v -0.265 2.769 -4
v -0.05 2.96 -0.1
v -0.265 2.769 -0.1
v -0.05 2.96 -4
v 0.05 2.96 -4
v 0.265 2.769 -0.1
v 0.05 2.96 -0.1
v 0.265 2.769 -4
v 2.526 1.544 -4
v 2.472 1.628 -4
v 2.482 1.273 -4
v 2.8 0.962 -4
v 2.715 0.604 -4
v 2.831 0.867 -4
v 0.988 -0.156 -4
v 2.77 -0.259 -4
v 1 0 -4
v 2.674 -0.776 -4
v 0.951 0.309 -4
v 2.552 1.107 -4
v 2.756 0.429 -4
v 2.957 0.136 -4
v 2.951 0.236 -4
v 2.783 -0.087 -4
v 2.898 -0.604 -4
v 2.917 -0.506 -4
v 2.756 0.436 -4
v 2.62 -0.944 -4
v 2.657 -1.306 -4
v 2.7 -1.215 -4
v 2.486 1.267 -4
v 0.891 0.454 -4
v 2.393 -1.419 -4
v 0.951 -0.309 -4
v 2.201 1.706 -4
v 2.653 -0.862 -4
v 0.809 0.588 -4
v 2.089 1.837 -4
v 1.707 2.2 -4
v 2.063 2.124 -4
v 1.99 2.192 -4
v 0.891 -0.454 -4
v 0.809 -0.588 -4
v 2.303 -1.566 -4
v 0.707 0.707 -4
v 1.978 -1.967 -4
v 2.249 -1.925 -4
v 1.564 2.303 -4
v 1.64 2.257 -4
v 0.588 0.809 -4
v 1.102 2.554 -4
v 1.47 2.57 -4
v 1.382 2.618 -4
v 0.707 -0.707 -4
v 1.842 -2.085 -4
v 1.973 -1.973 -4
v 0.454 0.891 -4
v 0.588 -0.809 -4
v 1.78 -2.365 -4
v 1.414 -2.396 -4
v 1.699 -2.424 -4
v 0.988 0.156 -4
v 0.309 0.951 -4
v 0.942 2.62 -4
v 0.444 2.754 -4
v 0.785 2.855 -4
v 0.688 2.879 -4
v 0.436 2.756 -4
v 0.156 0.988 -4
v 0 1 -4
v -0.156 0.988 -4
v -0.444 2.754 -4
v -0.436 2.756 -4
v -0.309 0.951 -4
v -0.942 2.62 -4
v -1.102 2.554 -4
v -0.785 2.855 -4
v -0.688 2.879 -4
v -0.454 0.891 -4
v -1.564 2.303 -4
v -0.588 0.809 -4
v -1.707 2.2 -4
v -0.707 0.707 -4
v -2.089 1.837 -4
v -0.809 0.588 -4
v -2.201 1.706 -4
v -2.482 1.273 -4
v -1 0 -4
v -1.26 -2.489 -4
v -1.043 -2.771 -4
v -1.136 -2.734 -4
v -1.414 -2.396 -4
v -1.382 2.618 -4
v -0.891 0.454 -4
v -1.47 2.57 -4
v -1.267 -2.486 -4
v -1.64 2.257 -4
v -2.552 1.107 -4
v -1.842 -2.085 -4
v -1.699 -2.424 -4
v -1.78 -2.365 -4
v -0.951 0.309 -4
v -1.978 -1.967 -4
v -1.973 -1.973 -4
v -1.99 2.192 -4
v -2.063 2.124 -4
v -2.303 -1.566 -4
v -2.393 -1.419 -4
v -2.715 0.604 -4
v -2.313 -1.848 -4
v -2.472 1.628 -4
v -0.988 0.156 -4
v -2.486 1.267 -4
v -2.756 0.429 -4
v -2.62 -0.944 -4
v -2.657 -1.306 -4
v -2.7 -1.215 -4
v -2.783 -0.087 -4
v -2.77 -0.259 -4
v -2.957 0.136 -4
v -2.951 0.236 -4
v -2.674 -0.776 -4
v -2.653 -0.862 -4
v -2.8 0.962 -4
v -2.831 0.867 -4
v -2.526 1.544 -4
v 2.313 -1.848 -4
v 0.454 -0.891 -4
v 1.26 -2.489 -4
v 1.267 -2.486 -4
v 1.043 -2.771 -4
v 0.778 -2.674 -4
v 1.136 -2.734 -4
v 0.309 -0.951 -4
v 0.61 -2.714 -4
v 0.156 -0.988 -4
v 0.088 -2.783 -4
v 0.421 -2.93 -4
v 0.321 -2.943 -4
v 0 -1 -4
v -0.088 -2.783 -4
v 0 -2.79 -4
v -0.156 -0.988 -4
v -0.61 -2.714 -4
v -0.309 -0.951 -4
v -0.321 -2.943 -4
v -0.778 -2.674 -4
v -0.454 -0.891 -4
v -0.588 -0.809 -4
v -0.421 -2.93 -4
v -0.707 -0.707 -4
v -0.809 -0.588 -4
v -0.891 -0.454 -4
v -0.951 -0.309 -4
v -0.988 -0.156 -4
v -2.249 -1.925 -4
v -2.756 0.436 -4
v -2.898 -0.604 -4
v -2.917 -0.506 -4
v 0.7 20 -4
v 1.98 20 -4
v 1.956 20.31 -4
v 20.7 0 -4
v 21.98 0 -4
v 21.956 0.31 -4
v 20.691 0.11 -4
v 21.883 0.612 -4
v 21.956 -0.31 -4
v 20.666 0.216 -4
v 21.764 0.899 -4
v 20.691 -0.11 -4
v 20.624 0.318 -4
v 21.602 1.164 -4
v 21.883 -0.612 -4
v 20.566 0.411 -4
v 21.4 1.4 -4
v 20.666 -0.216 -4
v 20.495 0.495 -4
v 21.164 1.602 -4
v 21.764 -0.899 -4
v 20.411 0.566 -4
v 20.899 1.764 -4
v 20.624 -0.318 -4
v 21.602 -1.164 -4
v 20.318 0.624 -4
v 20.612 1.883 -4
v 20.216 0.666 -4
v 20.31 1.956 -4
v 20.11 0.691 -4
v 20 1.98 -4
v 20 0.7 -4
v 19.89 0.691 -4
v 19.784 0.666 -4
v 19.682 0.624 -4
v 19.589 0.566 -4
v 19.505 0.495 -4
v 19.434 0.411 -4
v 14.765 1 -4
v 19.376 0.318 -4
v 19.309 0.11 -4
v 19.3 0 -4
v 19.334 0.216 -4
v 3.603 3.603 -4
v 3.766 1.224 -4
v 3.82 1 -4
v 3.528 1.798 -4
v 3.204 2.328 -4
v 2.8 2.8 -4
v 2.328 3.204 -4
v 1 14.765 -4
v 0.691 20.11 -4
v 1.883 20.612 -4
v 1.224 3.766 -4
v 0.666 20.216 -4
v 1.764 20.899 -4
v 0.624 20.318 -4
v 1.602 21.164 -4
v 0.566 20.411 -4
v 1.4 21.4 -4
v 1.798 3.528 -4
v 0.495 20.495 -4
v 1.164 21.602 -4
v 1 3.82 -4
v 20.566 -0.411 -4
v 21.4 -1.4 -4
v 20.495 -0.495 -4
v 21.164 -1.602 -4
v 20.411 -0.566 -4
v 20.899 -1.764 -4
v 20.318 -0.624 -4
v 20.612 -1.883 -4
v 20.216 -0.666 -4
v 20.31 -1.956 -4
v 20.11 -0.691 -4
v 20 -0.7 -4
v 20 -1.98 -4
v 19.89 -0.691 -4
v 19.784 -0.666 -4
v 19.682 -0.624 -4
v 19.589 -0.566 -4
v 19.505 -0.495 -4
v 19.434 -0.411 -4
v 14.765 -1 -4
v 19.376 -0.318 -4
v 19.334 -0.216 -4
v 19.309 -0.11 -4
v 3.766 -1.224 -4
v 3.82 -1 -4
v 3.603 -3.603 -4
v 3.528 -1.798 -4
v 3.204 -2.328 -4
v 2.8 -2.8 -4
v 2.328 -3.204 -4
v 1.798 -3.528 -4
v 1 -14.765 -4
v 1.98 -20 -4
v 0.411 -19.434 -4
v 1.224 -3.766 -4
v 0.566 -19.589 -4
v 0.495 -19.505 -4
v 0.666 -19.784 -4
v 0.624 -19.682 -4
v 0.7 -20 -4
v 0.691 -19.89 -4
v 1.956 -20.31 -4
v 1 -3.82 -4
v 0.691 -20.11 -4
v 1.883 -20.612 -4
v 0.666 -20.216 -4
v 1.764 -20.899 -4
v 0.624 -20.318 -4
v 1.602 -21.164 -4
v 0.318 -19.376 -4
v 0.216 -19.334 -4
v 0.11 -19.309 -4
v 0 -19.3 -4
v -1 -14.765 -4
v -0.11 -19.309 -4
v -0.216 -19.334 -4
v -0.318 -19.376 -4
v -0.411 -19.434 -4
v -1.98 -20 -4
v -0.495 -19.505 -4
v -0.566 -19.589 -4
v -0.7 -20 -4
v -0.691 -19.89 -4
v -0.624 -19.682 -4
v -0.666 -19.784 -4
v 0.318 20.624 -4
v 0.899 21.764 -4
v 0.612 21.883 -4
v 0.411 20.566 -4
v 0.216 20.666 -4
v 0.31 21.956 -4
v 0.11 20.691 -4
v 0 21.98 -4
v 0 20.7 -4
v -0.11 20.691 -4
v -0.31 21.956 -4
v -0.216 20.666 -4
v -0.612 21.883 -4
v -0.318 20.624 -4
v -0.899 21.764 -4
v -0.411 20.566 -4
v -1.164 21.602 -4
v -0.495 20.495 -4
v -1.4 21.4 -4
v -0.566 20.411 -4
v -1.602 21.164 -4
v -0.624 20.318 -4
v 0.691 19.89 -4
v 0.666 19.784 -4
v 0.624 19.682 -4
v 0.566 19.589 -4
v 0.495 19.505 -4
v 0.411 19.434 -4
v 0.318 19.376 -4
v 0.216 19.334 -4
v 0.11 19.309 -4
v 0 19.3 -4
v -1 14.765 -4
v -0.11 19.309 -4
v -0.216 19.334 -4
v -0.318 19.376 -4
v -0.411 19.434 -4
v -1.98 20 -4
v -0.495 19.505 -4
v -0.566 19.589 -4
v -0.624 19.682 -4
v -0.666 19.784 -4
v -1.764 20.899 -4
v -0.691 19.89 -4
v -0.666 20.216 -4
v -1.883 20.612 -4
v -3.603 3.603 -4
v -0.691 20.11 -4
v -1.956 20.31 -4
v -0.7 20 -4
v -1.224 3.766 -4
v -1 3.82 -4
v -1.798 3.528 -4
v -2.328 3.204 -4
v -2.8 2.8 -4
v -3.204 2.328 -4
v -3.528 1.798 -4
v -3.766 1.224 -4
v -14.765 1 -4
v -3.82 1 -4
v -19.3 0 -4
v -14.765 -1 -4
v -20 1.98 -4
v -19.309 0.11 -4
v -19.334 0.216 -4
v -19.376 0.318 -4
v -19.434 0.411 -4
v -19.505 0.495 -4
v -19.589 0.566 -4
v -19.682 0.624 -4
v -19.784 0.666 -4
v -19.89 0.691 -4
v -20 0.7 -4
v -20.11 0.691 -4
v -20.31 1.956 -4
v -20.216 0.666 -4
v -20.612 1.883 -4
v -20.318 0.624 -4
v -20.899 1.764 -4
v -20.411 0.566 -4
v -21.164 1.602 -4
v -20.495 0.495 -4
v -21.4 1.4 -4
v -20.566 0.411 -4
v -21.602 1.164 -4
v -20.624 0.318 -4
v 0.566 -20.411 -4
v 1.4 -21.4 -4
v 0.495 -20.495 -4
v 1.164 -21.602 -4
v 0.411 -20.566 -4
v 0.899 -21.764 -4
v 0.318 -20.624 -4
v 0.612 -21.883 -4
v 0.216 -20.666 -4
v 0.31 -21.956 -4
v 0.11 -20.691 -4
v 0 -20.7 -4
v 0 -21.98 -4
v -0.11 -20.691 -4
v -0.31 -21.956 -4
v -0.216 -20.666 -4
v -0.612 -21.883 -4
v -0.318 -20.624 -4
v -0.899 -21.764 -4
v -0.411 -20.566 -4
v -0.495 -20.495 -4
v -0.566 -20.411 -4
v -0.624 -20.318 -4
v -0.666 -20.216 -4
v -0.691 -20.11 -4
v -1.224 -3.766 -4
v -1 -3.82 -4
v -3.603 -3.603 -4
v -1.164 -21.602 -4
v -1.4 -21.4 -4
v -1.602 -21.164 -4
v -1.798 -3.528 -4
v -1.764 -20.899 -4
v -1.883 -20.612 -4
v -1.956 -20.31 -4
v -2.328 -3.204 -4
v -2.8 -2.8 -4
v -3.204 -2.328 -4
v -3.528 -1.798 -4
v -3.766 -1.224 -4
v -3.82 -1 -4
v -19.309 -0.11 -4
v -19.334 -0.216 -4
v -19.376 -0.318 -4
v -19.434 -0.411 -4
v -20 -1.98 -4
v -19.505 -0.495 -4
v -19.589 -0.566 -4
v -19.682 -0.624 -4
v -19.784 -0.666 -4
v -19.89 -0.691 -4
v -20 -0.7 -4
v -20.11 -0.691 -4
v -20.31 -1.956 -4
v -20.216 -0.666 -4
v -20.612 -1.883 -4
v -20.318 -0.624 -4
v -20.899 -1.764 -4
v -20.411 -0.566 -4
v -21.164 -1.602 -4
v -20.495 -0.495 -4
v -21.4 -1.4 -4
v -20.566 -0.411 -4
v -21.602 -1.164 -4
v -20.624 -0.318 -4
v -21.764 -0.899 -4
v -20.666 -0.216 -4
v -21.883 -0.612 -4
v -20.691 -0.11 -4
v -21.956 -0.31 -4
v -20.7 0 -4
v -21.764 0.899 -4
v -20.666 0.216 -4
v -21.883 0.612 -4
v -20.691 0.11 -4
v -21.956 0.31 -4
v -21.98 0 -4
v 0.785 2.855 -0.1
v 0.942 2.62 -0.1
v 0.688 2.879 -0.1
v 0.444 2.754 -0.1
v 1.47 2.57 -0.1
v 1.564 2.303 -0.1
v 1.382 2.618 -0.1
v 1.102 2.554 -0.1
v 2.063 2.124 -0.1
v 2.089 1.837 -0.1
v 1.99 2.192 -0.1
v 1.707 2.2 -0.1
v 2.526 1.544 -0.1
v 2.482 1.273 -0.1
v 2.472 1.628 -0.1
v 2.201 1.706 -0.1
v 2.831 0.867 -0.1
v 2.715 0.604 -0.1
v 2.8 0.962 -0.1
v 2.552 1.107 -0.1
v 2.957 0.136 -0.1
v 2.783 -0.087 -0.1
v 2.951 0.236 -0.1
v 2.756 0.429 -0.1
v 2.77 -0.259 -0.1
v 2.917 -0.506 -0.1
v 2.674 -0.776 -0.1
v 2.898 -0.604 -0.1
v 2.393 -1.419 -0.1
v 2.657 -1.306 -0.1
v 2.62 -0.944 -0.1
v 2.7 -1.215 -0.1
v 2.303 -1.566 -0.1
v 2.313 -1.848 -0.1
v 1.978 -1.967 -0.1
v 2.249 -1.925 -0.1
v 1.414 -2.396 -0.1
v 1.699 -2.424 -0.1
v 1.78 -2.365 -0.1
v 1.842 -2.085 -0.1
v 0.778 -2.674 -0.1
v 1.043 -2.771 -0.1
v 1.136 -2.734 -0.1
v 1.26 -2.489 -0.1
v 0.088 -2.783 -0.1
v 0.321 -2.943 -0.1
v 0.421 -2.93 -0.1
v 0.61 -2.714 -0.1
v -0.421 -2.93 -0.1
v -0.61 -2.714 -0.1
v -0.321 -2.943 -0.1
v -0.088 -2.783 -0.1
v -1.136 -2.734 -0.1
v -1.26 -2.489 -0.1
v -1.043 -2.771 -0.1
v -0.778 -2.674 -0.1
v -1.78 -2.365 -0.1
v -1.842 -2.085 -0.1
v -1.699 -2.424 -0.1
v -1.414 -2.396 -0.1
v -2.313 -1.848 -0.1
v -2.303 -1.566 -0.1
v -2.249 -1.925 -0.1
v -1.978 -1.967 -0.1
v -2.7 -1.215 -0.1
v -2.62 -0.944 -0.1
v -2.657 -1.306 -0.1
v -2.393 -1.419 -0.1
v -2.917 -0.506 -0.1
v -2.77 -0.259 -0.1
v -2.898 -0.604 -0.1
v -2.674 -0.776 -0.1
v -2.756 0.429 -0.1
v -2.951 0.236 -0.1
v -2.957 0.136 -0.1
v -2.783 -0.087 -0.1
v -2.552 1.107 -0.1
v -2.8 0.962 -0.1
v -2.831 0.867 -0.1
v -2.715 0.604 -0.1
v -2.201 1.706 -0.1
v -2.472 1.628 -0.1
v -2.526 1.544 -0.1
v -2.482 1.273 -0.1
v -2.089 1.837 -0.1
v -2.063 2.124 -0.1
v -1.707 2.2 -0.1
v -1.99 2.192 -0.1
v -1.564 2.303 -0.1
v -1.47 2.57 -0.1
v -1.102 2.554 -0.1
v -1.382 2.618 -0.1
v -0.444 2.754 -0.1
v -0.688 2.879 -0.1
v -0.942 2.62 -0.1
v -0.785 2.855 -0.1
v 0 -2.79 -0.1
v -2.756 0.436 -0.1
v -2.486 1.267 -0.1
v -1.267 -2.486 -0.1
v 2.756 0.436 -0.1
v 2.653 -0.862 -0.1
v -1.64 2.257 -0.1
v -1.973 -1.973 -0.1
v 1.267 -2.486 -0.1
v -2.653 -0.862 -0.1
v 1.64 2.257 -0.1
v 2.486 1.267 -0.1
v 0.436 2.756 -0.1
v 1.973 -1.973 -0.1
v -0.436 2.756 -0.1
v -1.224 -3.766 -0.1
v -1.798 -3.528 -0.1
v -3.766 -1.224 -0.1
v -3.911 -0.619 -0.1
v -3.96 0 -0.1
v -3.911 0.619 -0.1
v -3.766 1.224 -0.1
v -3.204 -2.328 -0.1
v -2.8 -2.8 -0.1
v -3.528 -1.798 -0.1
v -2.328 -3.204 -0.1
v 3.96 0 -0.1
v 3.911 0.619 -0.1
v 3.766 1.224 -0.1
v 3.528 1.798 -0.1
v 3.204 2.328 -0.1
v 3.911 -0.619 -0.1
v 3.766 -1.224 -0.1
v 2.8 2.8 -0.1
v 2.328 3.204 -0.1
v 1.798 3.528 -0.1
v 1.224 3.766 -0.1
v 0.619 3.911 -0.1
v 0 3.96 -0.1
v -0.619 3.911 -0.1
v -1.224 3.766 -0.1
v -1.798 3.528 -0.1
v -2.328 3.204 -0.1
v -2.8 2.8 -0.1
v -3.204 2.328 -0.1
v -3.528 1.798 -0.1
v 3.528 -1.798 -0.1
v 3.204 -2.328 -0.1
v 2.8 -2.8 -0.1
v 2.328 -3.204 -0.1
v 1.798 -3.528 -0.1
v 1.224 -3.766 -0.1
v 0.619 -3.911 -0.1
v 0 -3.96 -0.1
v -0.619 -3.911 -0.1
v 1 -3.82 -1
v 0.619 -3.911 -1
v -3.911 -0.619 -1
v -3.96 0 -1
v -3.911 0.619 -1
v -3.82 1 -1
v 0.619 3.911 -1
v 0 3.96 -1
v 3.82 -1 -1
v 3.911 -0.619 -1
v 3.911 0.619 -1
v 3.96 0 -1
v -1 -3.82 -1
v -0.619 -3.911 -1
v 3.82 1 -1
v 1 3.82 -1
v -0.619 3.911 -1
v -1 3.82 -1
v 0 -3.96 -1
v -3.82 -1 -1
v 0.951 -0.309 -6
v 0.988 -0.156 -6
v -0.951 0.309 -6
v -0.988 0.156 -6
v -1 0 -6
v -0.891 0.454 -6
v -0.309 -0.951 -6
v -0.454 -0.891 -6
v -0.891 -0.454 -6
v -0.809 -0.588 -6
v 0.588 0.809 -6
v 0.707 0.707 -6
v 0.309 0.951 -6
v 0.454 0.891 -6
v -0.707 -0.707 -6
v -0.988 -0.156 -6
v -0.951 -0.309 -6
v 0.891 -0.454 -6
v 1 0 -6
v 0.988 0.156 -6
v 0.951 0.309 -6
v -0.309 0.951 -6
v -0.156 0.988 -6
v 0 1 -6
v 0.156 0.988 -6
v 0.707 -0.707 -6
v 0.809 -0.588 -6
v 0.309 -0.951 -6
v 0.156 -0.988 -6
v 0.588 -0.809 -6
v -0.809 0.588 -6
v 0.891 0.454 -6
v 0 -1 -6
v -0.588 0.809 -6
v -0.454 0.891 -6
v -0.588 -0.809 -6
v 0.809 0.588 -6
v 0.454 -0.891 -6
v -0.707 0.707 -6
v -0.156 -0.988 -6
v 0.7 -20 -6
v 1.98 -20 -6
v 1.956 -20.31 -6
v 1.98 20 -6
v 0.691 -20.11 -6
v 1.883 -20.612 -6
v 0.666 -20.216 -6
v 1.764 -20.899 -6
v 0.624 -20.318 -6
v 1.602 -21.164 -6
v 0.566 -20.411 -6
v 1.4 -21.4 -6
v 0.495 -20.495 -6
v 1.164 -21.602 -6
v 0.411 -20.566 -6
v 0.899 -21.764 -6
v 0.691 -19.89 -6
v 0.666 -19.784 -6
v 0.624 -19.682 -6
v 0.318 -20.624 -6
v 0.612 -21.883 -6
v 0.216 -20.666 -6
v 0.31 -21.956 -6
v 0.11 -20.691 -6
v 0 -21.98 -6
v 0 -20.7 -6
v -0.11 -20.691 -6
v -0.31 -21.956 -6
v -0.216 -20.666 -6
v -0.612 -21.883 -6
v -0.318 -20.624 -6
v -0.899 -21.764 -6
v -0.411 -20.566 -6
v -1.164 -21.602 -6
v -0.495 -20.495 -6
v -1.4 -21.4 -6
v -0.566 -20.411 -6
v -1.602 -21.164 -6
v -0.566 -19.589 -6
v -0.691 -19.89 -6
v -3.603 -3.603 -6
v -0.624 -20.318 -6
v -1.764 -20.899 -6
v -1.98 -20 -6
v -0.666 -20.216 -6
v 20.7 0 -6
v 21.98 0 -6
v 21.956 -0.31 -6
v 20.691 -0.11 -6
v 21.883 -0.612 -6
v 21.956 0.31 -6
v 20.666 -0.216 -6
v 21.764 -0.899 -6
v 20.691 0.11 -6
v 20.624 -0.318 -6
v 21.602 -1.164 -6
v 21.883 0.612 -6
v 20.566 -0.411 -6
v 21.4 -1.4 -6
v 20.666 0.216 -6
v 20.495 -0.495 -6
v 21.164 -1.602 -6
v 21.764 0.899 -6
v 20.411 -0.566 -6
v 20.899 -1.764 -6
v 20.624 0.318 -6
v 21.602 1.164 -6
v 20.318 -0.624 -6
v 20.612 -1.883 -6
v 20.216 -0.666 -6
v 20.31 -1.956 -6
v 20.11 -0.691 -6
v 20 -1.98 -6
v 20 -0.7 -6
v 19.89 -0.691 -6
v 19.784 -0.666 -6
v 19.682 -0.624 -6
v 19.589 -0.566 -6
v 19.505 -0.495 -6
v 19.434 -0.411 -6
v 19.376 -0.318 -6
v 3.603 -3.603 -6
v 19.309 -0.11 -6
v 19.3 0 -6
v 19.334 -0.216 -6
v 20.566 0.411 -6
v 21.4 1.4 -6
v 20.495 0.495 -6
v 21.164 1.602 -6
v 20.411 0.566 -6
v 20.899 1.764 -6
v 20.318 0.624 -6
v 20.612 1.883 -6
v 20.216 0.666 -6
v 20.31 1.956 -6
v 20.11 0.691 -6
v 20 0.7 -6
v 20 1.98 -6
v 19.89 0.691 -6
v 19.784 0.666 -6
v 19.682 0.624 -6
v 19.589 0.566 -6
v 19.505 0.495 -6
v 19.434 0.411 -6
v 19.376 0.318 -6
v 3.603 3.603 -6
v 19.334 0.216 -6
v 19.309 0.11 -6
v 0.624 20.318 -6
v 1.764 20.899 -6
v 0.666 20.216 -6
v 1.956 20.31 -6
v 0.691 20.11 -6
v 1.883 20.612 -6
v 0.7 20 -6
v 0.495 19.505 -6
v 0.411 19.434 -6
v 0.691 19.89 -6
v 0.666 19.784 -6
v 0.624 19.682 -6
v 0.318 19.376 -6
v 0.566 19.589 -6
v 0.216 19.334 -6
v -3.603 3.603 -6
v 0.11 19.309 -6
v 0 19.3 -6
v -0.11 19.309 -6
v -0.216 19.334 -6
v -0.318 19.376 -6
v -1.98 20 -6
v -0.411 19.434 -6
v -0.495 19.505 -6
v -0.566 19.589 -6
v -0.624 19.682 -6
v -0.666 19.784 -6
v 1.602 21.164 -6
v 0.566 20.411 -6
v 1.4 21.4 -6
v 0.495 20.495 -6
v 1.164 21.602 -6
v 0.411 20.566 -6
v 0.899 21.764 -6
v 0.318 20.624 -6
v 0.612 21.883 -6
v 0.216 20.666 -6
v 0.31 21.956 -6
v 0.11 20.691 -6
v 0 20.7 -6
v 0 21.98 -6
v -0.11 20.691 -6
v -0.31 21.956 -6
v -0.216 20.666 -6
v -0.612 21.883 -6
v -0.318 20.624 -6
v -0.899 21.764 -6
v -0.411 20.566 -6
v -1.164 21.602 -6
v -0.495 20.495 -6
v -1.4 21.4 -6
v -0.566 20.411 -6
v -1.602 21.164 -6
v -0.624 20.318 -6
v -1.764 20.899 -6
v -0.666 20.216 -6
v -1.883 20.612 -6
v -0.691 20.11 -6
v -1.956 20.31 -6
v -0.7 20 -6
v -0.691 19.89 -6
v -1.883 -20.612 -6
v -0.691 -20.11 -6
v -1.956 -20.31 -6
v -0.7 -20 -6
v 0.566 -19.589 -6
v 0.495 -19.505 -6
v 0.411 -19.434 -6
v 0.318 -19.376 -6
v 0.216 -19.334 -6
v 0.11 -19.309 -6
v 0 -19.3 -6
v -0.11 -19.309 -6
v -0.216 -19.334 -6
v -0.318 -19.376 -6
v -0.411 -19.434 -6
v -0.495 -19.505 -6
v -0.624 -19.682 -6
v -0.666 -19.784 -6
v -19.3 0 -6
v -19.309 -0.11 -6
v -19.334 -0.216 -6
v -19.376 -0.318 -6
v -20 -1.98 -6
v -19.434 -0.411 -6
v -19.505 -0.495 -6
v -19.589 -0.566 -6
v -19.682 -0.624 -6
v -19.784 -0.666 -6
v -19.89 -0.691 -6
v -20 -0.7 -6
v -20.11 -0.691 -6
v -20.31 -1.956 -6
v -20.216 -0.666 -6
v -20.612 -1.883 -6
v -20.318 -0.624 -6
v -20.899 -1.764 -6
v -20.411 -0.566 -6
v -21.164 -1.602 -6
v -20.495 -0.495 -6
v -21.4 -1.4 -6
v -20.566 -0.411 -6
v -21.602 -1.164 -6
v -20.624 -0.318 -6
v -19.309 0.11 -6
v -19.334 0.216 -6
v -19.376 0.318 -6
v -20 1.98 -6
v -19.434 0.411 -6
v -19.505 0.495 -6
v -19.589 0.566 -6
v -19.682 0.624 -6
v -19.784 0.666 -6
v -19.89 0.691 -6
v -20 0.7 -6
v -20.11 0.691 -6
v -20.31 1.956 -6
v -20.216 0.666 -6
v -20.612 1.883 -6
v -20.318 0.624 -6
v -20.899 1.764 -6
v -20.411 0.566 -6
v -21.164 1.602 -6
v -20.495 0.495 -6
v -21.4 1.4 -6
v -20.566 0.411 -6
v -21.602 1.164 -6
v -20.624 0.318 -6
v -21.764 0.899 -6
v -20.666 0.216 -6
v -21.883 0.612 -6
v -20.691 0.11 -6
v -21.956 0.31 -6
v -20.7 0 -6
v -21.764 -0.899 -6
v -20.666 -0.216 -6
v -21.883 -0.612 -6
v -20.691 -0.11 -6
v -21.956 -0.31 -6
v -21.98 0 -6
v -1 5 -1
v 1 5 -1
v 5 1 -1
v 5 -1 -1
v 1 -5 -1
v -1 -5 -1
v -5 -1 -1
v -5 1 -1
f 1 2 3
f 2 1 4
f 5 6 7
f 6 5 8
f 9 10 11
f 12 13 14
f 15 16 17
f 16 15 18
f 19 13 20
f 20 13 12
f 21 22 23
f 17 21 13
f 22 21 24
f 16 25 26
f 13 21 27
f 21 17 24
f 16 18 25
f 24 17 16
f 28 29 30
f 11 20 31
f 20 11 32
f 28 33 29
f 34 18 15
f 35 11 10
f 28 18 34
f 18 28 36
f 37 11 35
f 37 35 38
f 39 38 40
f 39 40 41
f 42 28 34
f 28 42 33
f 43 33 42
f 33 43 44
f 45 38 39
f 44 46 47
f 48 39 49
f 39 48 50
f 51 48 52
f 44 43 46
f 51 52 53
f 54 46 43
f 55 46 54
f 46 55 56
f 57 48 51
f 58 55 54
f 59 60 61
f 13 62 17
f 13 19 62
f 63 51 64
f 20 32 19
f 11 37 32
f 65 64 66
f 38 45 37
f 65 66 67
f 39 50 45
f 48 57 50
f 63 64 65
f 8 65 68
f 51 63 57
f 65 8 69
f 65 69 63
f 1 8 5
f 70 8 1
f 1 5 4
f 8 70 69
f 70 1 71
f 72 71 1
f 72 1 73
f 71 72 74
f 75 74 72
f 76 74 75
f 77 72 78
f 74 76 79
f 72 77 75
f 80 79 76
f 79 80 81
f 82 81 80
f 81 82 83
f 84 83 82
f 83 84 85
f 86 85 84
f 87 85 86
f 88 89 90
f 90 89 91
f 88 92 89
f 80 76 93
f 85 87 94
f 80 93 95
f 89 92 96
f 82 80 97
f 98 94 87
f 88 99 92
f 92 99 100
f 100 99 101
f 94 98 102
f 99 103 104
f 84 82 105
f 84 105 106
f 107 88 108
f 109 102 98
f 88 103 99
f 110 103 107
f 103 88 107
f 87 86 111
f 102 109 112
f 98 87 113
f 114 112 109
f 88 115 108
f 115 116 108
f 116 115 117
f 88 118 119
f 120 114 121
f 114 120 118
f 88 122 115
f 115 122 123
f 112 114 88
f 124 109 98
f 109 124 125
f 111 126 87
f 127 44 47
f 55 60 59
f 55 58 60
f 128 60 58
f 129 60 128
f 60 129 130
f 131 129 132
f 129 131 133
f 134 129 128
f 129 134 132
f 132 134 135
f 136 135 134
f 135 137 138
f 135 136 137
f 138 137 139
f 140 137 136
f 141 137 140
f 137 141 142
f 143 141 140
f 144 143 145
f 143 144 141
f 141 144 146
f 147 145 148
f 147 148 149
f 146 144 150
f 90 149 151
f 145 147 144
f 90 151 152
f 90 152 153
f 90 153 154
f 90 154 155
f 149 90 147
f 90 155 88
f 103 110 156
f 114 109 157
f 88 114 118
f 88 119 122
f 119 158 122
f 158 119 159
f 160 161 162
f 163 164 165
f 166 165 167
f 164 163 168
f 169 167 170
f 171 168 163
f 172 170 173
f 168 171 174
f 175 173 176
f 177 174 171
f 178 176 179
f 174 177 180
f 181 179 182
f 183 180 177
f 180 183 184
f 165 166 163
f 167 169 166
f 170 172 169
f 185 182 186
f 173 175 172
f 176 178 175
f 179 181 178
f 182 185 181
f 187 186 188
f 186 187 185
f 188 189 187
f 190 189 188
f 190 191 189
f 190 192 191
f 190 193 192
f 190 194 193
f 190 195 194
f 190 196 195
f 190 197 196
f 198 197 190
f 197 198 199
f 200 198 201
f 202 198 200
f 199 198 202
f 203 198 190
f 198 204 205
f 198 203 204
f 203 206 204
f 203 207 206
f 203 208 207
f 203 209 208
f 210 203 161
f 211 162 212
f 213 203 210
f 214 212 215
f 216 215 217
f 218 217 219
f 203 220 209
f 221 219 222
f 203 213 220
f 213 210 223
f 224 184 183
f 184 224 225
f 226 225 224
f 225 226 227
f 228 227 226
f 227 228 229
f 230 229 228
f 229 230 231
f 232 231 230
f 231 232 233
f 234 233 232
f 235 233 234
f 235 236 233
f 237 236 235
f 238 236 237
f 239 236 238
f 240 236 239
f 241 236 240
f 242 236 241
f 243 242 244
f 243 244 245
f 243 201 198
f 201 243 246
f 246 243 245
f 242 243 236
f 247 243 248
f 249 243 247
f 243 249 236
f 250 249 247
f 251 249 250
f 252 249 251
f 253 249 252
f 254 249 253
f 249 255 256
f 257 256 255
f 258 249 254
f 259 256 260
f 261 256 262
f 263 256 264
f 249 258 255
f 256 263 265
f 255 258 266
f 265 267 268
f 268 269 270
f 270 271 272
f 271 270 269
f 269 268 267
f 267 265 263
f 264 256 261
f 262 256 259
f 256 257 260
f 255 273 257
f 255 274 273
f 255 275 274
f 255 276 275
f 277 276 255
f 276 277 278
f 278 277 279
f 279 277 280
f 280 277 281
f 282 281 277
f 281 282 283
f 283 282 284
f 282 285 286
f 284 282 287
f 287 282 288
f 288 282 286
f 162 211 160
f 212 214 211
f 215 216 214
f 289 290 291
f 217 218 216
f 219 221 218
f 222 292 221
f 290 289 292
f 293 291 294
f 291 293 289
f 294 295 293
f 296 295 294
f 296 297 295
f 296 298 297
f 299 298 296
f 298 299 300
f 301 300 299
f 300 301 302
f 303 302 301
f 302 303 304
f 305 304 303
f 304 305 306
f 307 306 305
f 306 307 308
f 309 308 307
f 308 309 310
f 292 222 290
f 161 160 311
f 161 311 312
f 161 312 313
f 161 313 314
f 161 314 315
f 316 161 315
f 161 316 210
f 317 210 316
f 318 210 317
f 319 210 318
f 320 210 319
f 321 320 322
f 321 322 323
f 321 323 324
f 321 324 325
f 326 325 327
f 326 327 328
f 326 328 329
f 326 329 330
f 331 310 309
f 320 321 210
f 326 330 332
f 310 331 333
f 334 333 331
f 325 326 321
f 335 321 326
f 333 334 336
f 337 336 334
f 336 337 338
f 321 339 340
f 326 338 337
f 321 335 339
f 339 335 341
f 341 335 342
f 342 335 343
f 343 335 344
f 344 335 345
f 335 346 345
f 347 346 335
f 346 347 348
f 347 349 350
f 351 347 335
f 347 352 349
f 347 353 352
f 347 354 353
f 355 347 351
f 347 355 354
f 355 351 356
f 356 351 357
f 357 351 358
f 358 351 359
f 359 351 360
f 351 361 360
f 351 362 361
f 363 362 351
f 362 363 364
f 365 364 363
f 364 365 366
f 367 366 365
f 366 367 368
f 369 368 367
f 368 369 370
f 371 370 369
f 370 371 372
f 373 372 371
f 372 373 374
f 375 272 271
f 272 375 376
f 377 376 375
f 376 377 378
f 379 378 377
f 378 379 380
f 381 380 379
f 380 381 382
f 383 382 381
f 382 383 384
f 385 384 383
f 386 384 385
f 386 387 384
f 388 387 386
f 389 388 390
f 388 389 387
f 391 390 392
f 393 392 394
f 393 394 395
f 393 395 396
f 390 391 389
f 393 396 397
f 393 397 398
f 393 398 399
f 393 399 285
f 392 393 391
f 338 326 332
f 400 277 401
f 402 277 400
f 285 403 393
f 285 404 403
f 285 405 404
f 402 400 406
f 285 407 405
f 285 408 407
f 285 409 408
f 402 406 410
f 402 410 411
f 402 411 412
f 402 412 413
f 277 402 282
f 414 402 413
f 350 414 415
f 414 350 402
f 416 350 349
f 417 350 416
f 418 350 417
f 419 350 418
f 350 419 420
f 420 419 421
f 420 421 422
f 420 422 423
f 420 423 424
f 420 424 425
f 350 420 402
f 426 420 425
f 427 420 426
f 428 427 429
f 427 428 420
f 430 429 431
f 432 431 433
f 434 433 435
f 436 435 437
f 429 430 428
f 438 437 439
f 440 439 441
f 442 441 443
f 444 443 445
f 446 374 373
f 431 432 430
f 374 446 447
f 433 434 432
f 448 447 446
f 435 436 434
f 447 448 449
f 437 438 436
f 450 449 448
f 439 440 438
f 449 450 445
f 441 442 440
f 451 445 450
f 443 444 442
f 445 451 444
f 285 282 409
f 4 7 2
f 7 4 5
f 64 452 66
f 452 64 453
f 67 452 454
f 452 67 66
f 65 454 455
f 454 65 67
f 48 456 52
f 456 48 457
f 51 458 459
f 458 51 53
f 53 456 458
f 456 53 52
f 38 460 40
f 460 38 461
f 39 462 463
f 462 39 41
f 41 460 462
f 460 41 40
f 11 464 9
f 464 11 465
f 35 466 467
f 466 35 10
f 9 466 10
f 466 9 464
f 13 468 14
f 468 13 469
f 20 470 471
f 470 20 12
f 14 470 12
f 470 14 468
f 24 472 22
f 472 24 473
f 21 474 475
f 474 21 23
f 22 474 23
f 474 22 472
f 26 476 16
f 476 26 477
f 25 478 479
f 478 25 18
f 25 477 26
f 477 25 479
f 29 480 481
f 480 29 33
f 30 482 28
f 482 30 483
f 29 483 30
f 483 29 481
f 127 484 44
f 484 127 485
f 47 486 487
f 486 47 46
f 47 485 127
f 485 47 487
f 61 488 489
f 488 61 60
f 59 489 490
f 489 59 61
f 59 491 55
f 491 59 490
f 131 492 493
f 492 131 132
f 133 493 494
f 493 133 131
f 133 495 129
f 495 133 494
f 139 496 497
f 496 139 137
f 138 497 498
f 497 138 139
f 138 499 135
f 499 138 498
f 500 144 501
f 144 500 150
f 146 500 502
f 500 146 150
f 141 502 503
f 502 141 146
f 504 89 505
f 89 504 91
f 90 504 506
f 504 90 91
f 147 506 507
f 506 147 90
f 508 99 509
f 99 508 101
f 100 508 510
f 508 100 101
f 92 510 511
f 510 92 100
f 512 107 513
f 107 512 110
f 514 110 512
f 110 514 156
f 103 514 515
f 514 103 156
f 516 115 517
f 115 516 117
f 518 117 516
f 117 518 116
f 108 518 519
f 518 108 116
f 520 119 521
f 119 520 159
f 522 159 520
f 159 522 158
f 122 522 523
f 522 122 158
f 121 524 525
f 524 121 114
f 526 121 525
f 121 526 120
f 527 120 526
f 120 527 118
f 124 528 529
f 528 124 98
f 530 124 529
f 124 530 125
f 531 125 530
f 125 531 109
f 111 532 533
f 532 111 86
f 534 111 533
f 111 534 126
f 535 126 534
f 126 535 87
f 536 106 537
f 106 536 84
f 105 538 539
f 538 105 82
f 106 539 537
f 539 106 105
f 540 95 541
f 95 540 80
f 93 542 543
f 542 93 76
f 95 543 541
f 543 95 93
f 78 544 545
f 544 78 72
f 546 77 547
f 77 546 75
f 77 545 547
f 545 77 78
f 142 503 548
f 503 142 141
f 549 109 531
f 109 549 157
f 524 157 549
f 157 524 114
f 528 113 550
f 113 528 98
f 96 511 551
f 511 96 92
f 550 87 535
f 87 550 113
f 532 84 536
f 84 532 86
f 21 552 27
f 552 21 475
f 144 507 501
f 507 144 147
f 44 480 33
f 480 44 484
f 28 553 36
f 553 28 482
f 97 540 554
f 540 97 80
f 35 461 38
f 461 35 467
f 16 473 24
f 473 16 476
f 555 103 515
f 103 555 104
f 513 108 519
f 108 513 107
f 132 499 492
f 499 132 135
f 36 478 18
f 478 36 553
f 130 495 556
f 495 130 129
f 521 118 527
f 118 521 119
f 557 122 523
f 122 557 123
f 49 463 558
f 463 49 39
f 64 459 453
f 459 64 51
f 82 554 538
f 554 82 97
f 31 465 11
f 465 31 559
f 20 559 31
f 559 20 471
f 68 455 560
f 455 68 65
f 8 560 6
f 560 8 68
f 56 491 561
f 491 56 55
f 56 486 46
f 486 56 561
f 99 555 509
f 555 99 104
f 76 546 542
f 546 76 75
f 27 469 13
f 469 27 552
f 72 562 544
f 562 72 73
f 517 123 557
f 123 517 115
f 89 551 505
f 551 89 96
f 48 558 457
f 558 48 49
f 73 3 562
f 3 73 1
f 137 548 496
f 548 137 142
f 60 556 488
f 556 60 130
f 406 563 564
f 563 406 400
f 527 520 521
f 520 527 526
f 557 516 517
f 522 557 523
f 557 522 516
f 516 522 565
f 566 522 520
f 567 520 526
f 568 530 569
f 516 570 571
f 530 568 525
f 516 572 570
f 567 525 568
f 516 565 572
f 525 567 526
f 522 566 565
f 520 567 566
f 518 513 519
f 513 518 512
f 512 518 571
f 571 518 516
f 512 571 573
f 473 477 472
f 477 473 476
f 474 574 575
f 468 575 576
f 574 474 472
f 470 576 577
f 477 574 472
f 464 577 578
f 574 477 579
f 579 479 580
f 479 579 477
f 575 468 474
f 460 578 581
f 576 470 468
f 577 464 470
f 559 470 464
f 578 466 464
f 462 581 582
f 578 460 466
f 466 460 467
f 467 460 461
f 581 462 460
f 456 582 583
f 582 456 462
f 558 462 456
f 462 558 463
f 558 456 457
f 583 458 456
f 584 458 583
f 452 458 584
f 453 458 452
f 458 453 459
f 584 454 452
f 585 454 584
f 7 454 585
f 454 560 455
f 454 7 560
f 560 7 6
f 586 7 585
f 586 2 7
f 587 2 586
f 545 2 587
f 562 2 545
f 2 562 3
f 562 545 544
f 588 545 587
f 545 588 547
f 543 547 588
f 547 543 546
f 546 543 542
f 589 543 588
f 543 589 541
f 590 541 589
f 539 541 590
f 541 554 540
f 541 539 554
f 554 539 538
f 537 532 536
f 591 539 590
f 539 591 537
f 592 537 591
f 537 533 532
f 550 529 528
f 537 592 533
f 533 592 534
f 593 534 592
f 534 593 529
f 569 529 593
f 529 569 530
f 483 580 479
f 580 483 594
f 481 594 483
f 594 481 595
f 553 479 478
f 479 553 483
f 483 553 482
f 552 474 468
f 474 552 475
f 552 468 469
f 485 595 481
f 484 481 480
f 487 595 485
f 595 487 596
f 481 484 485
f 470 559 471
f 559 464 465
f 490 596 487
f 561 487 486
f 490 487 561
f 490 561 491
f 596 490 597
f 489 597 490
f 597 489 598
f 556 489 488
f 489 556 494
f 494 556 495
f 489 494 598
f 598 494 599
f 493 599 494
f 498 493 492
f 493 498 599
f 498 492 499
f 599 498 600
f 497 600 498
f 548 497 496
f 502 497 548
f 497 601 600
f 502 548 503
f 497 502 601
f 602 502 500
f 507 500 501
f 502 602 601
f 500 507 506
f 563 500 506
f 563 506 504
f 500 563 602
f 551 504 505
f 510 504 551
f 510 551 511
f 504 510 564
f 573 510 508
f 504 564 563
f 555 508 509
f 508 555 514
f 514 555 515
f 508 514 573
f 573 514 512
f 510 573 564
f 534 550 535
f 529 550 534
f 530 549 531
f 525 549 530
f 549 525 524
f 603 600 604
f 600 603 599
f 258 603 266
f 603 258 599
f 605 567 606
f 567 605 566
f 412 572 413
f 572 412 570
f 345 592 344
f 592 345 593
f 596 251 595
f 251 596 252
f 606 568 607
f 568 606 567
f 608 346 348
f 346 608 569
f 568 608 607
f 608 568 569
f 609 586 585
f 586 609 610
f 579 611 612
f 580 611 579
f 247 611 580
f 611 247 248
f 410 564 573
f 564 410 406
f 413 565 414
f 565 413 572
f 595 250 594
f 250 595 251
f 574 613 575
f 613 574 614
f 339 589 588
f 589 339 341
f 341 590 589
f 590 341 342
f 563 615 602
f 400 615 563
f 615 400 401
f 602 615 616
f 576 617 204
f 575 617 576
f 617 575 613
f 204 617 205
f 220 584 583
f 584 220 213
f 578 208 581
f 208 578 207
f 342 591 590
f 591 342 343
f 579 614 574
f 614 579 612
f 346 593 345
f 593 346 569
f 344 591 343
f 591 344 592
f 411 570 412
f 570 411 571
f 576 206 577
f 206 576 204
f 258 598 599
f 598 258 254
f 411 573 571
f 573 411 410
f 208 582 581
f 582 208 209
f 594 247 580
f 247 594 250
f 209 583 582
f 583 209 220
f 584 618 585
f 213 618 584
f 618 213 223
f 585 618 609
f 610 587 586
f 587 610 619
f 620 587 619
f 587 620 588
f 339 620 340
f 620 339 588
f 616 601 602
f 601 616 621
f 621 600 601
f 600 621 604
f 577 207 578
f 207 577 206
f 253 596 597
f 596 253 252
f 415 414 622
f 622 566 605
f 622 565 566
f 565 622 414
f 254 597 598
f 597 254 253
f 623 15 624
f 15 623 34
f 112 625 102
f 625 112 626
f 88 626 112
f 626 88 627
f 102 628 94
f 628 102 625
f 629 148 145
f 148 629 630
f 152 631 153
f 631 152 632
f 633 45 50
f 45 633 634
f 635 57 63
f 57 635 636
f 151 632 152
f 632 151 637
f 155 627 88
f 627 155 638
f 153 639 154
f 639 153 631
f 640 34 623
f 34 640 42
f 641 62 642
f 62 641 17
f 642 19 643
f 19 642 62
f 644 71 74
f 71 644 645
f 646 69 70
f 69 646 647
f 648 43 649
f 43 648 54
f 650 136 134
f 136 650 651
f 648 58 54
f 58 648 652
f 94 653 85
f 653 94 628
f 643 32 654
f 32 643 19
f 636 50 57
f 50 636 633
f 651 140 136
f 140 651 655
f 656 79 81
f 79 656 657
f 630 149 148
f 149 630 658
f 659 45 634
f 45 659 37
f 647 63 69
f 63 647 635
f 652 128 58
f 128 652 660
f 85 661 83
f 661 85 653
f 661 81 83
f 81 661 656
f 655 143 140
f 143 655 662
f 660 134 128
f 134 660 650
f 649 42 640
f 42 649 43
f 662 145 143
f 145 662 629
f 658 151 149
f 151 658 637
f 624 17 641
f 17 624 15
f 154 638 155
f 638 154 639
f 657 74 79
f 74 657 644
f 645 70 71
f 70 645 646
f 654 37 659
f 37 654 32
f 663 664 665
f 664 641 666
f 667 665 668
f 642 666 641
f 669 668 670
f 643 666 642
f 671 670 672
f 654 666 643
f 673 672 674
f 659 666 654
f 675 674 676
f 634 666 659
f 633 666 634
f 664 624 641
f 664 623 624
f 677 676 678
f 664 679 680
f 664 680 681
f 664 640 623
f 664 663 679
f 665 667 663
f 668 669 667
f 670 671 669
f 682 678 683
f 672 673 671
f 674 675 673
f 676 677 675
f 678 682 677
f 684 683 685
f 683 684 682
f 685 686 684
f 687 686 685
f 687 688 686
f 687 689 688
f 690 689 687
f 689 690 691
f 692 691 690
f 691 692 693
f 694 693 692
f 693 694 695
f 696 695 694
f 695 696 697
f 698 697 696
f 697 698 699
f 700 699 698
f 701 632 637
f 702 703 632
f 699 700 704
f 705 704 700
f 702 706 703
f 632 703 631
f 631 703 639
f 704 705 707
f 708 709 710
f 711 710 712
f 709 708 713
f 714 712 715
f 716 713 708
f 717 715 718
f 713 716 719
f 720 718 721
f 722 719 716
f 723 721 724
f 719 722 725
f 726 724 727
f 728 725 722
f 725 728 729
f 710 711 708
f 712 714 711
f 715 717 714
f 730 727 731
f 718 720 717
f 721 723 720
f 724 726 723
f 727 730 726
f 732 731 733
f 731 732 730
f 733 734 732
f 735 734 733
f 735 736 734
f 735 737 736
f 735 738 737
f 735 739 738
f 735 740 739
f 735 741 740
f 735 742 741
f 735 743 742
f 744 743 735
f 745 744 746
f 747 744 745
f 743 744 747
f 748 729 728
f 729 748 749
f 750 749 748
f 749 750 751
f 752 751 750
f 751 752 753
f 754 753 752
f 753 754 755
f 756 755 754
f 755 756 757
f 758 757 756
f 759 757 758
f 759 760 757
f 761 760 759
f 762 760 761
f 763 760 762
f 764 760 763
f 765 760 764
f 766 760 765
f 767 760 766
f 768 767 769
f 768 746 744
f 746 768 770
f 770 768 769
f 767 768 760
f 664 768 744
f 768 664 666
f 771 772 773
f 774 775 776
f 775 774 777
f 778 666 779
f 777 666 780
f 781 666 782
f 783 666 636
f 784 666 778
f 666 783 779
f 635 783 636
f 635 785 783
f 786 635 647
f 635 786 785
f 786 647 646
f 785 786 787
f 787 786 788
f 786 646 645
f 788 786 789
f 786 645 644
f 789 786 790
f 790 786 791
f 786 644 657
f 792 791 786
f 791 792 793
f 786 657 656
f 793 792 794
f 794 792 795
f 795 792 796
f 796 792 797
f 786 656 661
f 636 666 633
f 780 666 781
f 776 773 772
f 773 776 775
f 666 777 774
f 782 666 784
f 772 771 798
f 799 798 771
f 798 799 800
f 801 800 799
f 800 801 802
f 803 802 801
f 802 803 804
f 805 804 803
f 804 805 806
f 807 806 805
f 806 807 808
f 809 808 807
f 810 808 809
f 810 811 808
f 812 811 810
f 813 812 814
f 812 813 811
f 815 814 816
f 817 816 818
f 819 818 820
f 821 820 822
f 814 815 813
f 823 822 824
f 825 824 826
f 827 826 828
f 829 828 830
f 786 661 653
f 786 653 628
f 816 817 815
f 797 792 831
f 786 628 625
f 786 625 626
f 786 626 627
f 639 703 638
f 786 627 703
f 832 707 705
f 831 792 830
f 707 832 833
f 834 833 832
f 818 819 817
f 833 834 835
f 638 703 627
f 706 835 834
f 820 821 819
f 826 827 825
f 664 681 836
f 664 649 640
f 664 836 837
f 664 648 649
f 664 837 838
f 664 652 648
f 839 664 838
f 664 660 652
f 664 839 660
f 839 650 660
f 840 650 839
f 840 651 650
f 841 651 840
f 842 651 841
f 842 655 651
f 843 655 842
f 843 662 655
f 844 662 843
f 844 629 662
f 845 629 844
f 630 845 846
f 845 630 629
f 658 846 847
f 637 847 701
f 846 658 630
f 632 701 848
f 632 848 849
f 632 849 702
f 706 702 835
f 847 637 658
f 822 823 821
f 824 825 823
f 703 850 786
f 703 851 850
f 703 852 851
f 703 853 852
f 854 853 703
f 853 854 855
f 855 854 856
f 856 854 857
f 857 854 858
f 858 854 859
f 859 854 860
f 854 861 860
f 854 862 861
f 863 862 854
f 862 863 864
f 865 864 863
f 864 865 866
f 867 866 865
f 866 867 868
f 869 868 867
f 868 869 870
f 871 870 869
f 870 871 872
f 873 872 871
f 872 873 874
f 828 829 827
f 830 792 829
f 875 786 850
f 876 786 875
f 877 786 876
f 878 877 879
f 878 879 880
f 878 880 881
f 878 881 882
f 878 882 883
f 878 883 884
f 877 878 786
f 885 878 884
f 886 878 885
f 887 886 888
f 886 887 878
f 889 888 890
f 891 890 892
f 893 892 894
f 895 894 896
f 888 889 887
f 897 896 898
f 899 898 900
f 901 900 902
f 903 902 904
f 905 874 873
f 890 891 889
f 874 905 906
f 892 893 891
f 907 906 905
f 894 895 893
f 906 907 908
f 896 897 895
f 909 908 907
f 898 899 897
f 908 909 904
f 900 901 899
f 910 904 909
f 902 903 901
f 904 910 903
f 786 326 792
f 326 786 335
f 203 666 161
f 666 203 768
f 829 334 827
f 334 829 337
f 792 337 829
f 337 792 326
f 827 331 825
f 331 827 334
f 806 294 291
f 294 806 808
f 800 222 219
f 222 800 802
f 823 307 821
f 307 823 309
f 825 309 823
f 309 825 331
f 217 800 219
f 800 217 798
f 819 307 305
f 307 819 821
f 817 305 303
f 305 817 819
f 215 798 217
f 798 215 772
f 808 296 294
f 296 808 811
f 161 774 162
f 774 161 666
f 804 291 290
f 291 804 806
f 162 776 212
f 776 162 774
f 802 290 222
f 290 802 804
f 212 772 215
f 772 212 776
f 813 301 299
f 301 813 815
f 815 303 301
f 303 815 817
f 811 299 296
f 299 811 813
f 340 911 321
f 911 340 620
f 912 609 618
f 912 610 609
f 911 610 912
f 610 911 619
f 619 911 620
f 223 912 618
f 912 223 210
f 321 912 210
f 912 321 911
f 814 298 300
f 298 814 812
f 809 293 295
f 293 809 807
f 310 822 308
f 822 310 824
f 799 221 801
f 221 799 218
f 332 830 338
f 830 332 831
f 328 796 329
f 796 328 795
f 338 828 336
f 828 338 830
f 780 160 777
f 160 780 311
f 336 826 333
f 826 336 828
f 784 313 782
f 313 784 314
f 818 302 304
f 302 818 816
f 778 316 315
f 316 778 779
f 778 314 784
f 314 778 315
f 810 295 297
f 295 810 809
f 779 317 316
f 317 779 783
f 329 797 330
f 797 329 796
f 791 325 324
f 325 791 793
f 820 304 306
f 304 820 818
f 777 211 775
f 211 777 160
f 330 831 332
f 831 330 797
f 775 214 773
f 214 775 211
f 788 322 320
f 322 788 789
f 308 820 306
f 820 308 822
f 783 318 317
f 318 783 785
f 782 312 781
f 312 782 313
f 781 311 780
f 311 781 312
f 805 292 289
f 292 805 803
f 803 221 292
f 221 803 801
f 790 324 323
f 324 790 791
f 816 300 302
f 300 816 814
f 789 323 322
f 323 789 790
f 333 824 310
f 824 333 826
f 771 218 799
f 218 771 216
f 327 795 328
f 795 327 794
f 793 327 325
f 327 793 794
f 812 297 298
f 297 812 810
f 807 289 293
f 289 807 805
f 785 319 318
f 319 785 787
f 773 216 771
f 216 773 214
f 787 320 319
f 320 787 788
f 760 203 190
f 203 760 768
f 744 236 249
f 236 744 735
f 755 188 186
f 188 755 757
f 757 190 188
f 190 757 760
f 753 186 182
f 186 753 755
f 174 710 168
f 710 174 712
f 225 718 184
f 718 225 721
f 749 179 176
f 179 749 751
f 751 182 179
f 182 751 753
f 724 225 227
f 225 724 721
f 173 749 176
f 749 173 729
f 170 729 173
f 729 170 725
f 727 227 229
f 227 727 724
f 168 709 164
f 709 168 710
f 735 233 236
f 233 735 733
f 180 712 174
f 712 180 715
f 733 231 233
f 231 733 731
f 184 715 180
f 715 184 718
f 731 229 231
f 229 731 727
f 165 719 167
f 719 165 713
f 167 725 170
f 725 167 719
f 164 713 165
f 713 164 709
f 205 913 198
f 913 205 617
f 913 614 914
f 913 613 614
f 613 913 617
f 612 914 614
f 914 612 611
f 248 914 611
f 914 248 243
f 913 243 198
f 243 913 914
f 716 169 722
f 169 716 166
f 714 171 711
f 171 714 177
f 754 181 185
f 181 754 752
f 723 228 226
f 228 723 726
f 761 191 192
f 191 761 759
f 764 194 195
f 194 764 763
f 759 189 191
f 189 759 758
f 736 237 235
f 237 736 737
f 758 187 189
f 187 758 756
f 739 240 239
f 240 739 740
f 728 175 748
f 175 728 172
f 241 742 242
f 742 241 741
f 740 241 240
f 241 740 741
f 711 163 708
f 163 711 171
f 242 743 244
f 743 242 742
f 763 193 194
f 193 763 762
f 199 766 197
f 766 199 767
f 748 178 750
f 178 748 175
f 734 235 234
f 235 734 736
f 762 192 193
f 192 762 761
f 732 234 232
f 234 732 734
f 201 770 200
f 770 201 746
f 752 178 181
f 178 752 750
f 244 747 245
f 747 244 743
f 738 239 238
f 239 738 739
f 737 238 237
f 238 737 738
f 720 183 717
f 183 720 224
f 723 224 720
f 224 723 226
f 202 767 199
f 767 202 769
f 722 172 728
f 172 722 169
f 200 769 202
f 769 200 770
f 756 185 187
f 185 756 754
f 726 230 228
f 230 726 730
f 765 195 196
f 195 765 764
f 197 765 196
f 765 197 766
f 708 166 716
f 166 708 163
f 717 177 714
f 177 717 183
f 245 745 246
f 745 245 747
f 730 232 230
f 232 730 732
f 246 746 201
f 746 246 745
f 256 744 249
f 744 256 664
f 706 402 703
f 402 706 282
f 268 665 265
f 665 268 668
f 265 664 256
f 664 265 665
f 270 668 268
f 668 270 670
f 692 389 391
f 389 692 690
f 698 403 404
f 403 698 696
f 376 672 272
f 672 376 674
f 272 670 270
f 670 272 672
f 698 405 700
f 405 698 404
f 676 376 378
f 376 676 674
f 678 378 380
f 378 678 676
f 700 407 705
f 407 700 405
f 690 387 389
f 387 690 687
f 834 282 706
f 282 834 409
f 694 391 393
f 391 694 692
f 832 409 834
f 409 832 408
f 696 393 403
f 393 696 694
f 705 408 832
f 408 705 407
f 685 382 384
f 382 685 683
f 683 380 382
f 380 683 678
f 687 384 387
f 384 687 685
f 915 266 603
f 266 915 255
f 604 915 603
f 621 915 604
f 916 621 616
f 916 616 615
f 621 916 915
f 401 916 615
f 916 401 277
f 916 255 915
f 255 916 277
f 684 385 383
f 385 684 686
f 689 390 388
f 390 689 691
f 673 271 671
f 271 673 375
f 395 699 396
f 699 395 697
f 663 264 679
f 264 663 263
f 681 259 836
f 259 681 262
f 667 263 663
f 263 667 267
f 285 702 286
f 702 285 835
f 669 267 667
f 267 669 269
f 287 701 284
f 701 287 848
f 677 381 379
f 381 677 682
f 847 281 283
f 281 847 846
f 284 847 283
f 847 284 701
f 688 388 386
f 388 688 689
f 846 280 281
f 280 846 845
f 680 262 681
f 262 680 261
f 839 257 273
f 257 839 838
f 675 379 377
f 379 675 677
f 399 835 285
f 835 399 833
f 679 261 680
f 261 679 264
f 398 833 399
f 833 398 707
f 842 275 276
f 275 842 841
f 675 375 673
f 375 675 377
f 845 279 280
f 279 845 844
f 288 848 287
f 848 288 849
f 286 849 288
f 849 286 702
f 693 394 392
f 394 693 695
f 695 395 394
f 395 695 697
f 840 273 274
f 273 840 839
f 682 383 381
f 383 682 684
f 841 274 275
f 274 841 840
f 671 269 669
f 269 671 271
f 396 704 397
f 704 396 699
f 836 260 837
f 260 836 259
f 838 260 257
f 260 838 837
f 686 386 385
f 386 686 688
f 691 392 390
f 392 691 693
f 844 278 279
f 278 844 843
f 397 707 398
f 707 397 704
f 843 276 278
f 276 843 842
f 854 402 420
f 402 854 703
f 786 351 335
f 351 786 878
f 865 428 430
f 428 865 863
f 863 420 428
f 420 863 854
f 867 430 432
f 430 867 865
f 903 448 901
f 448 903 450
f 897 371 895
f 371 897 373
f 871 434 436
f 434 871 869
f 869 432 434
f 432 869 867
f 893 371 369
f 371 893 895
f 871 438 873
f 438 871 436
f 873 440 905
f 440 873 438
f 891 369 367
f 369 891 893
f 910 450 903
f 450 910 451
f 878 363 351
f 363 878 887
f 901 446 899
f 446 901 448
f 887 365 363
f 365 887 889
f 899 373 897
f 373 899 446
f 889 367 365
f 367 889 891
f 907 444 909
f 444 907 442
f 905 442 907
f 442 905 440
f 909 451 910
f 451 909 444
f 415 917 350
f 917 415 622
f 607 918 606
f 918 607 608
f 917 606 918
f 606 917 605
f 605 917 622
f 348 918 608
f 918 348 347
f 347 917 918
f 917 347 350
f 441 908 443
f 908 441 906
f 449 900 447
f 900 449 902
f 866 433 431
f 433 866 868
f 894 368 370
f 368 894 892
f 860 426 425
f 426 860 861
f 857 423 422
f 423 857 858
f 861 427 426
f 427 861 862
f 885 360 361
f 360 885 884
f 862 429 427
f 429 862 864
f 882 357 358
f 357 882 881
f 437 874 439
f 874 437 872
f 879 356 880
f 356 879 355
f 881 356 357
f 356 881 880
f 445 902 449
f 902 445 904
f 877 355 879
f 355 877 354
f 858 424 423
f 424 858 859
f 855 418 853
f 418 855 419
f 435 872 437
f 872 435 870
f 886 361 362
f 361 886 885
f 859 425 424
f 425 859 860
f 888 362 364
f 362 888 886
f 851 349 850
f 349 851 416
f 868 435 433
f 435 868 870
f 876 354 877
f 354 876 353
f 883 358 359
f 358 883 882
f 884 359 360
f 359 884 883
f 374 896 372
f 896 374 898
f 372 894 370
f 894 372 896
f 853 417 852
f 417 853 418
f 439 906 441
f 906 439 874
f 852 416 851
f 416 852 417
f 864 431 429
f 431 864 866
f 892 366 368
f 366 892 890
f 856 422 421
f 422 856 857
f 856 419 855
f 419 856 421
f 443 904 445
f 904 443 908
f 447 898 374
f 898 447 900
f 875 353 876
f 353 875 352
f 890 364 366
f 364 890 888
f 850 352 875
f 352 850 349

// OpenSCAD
$fn = 40;

HOLDER_THICKNESS = 1;
SCREW_DIAMETER = 1;

ARM_COUNT = 1;

/**
 *  Head / Tooth parameters
 *  Futaba 3F Standard Spline
 *  http://www.servocity.com/html/futaba_servo_splines.html
 *  external diameter, tooth count, tooth height, tooth length, tooth width, thickness
 */
FUTABA_3F_SPLINE = [5.92, 25, 0.2, 0.55, 0.1, 4];

/**
 *  Tooth
 *
 *    |<-w->|
 *    |_____|___
 *    /     \  ^h
 *  _/       \_v
 *   |<--l-->|
 *
 *  - tooth length (l)
 *  - tooth width (w)
 *  - tooth height (h)
 *  - thickness
 *
 */
module servo_head_tooth(length, width, height, thickness) {
    linear_extrude(height = thickness) {
        polygon([[-length / 2, 0], [-width / 2, height], [width / 2, height], [length / 2,0]]);
    }
}

module servo_head(params) {

    diameter = params[0];
    count = params[1];
    height = params[2];
    length = params[3];
    width = params[4];
    thickness = params[5];

    % cylinder(r = diameter / 2, h = thickness + 1);

    cylinder(r = diameter / 2 - height + 0.03, h = thickness);

    for (i = [0 : count]) {
        rotate([0, 0, i * (360 / count)]) {
            translate([0, diameter / 2 - height, 0]) {
                servo_head_tooth(length, width, height, thickness);
            }
        }
    }
}

/**
 *  Servo hold
 *  - Head / Tooth parameters
 *  - Arms params (length and count)
 */
module servo_arm(params, arms) {

    diameter = params[0];
    count = params[1];
    height = params[2];
    length = params[3];
    width = params[4];
    thickness = params[5];

    arm_length = arms[0];
    arm_count = arms[1];

    /**
     *  Servo arm
     */
    module arm(length, width, head_height, thickness, hole_count = 1) {

        difference() {
            union() {
                cylinder(r = width / 2, h = thickness);

                linear_extrude(height = thickness) {
                    polygon([[-width / 2, 0], [-width / 4, length], [width / 4, length],[width / 2, 0]]);
                }

                translate([0, length, 0]) {
                    cylinder(r = width / 4, h = thickness);
                }

                translate([-thickness / 2 + 2, 3, -4]) {
                    rotate([90, 0, 0]) {
                        rotate([0, -90, 0]) {
                            linear_extrude(height = thickness) {
                                polygon([[-length / 1.7, 4], [0, 4], [0, - head_height + 5], [-2, - head_height + 5]]);
                            }
                        }
                    }
                }
            }

            // Hole
            for (i = [0 : hole_count - 1]) {
                //translate([0, length - (length / hole_count * i), -1]) {
                translate([0, length - (4 * i), -1]) {
                    cylinder(r = 0.7, h = 10);
                }
            }

            cylinder(r = SCREW_DIAMETER, h = 10);
        }
    }

    difference() {
        translate([0, 0, 0.1]) {
            cylinder(r = diameter / 2 + HOLDER_THICKNESS, h = thickness + 1);
        }

        cylinder(r = SCREW_DIAMETER, h = 10);

        servo_head(params);
    }

    // Arm
    translate([0, 0, thickness]) {
        for (i = [0 : arm_count - 1]) {
            rotate([0, 0, i * (360 / arm_count)]) {
                arm(arm_length, diameter + HOLDER_THICKNESS * 2, thickness, 2);
            }
        }
    }
}

rotate([0, 180, 0])
//intersection() {
//    cylinder(r = 5, h = 10);
    servo_arm(FUTABA_3F_SPLINE, [20, 4]);
//}

//tooth();
